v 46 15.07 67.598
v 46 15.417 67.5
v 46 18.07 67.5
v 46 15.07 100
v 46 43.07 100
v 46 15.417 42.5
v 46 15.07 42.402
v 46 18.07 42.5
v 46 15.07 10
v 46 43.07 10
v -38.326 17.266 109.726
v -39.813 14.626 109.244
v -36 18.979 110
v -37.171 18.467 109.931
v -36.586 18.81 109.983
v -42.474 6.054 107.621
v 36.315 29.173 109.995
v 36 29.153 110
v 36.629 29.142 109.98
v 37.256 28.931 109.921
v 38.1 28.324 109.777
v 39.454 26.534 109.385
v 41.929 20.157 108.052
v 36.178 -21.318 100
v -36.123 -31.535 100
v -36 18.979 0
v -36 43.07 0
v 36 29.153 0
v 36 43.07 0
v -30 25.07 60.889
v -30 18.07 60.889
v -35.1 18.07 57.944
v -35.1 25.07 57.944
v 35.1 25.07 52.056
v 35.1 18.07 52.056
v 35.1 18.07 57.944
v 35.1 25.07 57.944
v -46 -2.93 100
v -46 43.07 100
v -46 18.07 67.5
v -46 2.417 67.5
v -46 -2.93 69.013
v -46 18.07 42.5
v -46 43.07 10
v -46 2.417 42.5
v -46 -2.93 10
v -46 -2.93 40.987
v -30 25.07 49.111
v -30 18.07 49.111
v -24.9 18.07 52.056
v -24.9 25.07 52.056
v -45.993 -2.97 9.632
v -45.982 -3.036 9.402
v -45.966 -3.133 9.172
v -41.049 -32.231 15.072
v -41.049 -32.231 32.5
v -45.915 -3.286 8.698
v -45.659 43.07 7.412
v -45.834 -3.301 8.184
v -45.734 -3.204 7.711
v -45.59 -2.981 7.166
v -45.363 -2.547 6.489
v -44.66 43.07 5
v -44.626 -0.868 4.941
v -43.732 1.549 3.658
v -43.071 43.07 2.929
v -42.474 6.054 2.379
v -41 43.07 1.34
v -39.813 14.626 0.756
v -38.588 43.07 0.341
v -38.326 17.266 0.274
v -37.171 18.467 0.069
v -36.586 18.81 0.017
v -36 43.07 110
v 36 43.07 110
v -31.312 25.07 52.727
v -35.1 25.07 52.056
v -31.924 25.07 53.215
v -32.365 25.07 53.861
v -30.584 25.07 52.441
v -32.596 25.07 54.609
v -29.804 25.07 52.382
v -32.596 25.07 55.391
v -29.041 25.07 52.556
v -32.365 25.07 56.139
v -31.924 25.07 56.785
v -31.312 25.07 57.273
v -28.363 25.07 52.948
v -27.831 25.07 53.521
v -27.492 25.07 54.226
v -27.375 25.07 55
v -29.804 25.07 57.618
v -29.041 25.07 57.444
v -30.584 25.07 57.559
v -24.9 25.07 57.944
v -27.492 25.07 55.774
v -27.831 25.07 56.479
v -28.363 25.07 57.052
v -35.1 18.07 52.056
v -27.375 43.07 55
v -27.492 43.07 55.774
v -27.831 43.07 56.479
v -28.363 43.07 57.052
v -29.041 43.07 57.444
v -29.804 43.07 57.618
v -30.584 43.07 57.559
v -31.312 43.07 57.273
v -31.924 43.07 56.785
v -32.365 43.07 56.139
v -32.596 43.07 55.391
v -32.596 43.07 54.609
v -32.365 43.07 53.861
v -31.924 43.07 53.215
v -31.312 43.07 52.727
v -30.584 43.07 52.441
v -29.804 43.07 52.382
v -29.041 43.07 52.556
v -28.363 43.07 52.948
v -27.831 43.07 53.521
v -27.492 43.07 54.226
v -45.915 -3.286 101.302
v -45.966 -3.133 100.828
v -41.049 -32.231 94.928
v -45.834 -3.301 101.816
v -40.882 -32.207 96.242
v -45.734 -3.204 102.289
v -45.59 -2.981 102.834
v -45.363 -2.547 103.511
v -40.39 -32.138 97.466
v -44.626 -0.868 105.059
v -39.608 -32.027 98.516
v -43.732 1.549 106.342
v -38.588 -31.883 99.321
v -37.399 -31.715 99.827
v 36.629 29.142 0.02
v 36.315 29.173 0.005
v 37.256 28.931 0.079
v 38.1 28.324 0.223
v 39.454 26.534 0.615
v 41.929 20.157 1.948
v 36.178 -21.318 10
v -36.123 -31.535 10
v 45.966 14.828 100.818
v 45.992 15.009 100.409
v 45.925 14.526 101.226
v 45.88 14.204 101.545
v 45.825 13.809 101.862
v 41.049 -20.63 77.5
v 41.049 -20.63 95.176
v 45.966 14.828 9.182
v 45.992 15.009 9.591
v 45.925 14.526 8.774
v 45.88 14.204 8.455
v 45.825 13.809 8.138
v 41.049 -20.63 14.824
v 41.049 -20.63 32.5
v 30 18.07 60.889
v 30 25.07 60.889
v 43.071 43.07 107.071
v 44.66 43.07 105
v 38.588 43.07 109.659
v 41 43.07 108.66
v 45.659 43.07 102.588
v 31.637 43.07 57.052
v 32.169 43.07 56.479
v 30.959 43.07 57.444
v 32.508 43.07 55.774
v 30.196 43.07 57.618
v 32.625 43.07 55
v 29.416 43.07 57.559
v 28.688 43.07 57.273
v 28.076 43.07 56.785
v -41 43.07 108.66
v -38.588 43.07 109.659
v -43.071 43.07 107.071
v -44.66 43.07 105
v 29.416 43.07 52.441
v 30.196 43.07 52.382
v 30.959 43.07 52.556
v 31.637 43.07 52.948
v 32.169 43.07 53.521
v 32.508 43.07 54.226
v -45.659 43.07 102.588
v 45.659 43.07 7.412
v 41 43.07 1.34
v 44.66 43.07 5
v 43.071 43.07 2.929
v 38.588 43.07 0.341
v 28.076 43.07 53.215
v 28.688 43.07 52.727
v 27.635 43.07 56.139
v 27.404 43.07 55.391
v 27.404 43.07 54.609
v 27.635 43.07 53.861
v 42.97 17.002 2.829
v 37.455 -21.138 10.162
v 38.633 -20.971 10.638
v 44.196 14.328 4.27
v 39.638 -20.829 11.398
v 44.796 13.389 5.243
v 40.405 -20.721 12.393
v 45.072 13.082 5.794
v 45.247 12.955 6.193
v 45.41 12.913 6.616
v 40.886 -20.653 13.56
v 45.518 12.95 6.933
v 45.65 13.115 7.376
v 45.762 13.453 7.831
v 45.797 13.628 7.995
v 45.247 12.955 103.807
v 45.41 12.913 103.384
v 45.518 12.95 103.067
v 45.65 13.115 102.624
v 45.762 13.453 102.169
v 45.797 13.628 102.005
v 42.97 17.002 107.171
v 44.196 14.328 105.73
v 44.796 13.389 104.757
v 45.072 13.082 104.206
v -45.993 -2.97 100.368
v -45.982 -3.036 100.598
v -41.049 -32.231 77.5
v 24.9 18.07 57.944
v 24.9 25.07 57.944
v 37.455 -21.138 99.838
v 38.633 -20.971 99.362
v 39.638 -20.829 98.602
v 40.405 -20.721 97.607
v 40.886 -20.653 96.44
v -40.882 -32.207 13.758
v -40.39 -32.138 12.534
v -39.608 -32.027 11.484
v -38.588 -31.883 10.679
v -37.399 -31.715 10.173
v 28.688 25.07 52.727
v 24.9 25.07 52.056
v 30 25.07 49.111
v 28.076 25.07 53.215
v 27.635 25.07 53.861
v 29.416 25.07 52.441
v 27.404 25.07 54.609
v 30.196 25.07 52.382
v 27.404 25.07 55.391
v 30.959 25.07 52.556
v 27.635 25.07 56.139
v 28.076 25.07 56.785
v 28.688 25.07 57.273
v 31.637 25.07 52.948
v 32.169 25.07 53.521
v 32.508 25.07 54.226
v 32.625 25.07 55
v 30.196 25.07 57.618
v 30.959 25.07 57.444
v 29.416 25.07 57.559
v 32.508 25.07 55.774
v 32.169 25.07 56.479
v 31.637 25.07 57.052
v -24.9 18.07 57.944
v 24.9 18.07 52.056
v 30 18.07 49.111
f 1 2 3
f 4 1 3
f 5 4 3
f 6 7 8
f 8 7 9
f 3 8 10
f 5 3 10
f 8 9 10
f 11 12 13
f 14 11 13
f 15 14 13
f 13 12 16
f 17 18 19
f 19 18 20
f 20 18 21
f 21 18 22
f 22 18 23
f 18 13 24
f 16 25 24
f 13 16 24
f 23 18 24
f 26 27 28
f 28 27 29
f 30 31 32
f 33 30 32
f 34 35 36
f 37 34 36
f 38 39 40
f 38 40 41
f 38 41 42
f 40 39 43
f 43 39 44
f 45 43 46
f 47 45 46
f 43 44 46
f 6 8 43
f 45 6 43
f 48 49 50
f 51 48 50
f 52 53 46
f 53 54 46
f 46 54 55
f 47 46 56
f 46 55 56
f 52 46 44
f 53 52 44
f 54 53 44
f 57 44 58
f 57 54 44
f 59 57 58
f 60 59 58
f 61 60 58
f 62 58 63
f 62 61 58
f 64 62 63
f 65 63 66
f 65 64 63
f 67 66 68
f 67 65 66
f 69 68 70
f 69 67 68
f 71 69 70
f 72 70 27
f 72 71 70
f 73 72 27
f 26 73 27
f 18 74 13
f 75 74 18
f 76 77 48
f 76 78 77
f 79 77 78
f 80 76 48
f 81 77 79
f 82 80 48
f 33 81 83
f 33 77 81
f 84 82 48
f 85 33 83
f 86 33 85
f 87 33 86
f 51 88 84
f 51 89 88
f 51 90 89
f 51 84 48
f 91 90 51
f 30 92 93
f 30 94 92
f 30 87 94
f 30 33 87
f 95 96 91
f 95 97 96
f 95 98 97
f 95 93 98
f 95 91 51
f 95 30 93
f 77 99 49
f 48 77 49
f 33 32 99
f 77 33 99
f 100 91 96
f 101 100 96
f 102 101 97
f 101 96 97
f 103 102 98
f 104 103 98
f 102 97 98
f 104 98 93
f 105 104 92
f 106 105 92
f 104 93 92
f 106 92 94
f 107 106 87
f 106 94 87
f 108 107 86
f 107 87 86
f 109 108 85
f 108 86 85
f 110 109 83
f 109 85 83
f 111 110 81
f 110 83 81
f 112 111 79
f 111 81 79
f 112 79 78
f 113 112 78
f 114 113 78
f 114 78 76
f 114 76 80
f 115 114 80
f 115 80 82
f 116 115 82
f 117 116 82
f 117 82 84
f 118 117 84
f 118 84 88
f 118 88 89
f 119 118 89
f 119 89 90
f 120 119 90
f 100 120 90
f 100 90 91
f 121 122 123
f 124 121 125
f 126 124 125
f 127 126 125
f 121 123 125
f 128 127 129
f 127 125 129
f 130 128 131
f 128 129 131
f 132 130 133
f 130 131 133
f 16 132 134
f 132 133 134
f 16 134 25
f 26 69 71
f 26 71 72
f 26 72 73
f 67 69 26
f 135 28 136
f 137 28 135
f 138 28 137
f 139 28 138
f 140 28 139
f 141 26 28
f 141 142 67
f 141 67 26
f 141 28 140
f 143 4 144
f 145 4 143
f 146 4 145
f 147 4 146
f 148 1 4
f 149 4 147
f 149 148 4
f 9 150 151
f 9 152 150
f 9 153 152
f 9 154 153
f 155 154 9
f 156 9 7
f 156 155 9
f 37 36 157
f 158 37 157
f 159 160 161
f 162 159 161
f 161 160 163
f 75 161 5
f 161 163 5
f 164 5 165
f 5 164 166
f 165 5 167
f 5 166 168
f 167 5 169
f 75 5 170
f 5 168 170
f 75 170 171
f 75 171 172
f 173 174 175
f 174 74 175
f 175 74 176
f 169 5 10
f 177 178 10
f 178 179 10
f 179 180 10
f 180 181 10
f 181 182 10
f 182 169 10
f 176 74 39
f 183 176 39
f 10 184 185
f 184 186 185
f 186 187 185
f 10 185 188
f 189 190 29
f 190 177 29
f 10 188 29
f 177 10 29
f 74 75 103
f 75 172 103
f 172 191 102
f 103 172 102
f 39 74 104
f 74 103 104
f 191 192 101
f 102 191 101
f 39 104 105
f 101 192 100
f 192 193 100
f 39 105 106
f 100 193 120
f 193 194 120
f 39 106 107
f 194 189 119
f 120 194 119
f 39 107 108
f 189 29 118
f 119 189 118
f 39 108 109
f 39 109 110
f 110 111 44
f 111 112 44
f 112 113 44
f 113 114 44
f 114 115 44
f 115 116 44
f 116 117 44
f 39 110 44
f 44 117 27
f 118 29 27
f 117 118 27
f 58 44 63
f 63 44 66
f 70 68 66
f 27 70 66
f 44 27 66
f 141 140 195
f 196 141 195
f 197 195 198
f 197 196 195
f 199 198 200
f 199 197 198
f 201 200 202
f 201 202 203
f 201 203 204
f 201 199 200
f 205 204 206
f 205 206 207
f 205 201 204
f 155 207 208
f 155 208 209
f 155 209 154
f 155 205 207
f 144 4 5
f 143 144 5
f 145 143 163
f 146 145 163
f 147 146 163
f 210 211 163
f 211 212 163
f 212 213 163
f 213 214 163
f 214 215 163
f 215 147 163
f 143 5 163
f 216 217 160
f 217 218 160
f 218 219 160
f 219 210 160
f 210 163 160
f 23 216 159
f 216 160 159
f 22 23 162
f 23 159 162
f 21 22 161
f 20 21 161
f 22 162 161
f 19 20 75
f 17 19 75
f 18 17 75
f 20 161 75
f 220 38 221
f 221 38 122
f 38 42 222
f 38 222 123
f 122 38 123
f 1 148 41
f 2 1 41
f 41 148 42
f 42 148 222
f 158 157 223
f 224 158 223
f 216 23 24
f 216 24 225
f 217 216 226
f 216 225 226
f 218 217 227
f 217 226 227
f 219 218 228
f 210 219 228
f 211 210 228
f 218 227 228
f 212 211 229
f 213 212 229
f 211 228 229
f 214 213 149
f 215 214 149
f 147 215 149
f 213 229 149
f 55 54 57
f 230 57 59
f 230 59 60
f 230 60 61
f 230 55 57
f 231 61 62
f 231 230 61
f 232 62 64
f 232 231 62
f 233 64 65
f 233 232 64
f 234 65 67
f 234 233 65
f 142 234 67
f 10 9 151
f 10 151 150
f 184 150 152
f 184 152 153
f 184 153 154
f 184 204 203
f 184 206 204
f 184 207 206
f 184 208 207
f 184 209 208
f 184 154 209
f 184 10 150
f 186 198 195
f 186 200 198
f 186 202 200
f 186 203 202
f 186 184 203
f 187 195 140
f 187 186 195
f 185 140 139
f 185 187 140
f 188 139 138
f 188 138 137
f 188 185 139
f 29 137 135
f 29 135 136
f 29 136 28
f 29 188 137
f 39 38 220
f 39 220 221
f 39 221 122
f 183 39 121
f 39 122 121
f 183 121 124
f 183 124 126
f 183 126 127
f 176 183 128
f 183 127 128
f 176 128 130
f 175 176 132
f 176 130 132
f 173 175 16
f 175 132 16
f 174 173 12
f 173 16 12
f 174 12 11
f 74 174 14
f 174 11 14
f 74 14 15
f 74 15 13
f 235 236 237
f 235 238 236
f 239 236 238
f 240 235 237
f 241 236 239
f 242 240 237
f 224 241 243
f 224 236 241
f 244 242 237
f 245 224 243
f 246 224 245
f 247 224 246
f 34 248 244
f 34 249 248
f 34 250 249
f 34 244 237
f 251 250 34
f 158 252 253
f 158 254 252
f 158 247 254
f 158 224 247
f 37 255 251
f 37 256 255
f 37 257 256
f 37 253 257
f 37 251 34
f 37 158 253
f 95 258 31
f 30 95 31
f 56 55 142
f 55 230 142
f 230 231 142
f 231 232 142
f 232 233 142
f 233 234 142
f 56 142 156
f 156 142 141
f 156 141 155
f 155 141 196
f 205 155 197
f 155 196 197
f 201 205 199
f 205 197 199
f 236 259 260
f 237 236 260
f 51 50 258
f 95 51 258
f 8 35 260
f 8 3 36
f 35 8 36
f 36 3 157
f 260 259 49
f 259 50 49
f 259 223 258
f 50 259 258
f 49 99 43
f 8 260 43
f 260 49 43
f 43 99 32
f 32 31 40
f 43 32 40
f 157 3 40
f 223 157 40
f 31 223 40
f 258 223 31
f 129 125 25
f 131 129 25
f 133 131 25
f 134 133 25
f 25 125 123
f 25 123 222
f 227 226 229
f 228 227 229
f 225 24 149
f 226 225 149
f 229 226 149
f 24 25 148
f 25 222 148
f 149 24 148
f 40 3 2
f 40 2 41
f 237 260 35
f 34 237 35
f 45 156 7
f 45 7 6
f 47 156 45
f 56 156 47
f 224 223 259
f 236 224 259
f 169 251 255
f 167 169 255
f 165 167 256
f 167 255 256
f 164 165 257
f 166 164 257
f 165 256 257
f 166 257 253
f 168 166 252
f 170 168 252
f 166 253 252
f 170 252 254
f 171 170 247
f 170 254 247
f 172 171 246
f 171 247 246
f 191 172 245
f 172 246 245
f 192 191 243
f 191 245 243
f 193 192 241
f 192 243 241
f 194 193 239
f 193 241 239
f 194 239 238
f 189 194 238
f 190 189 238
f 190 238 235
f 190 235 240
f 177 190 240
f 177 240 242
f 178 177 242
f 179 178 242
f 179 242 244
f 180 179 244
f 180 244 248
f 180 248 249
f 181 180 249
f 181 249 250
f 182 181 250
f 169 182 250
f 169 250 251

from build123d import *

# Parameters (mm, degrees)
F1_DEPTH  = 110
F3_W      = 92
F3_H      = 25
F4_DEPTH  = 80
F5_SIZE2  = 10
F5_SIZE   = 50
F6_SIZE2  = 10
F6_SIZE   = 50
F7_SIZE2  = 10
F7_SIZE   = 35
F8_SIZE2  = 10
F8_SIZE   = 35
F9_SIZE2  = 5
F9_SIZE   = 35
F10_SIZE2 = 5
F10_SIZE  = 30
F11_R     = 10
F12_R     = 5
F14_D     = 5.25
F16_DEPTH = 7


with BuildPart() as f1:
    # F0 (on Top) → F1 (new body)
    with BuildSketch(Plane.XY):
        Polygon((46, 43.0696749699), (-46, 43.0696749699), (-46, -32.9303250301), (46, -19.9303250301), align=None)
    extrude(amount=F1_DEPTH)

    # F3 (on offset) → F4 (cut)
    with BuildSketch(Plane(origin=(0, 18.0696749699, 0), x_dir=(-1, 0, 0), z_dir=(0, 1, 0))):
        with Locations((0, 55)):
            Rectangle(F3_W, F3_H)
    extrude(amount=-F4_DEPTH, mode=Mode.SUBTRACT)

    # F5
    f5_edges = [f1.edges().sort_by_distance(p)[0] for p in [
        (0, -26.430325, 110),
    ]]
    f5_side = f1.faces().sort_by_distance((-1.434053, 8.218356, 110))[0]
    chamfer(f5_edges, length=F5_SIZE, length2=F5_SIZE2, reference=f5_side)

    # F6
    f6_edges = [f1.edges().sort_by_distance(p)[0] for p in [
        (0, -26.430325, 0),
    ]]
    f6_side = f1.faces().sort_by_distance((-1.434053, 8.218356, 0))[0]
    chamfer(f6_edges, length=F6_SIZE, length2=F6_SIZE2, reference=f6_side)

    # F7
    f7_edges = [f1.edges().sort_by_distance(p)[0] for p in [
        (0, -26.430325, 67.5),
    ]]
    f7_side = f1.faces().sort_by_distance((-2.2397, -4.338565, 67.5))[0]
    chamfer(f7_edges, length=F7_SIZE, length2=F7_SIZE2, reference=f7_side)

    # F8
    f8_edges = [f1.edges().sort_by_distance(p)[0] for p in [
        (0, -26.430325, 42.5),
    ]]
    f8_side = f1.faces().sort_by_distance((-2.2397, -4.338565, 42.5))[0]
    chamfer(f8_edges, length=F8_SIZE, length2=F8_SIZE2, reference=f8_side)

    # F9
    f9_edges = [f1.edges().sort_by_distance(p)[0] for p in [
        (46, -19.930325, 21.25),
        (46, -19.930325, 88.75),
    ]]
    f9_side = f1.faces().sort_by_distance((46, 16.743522, 41.232364))[0]
    chamfer(f9_edges, length=F9_SIZE, length2=F9_SIZE2, reference=f9_side)

    # F10
    f10_edges = [f1.edges().sort_by_distance(p)[0] for p in [
        (-46, -32.930325, 88.75),
        (-46, -32.930325, 21.25),
    ]]
    f10_side = f1.faces().sort_by_distance((-46, 10.243522, 41.162988))[0]
    chamfer(f10_edges, length=F10_SIZE, length2=F10_SIZE2, reference=f10_side)

    # F11
    f11_edges = [f1.edges().sort_by_distance(p)[0] for p in [
        (-46, 30.318028, 110),
        (-46, 30.318028, 0),
        (46, 36.818028, 0),
        (46, 36.818028, 110),
    ]]
    fillet(f11_edges, radius=F11_R)

    # F12
    f12_edges = [f1.edges().sort_by_distance(p)[0] for p in [
        (-42.964823, -20.893414, 7.701231),
        (42.845838, -7.674494, 7.484682),
        (42.845838, -7.674494, 102.515318),
        (-42.964823, -20.893414, 102.298769),
    ]]
    fillet(f12_edges, radius=F12_R)

    # F14 (through all)
    with Locations(Plane(origin=(0, 43.0696749699, 0), x_dir=(-1, 0, 0), z_dir=(0, 1, 0))):
        with Locations((-30, 55), (30, 55)):
            Hole(F14_D / 2)

    # F15 (on face) → F16 (cut)
    with BuildSketch(Plane.XZ.offset(-18.0696749699)):
        Polygon((-24.9, 52.0555136271), (-24.9, 57.9444863729), (-30, 60.8889727457), (-35.1, 57.9444863729), (-35.1, 52.0555136271), (-30, 49.1110272543), align=None)
        Polygon((24.9, 57.9444863729), (24.9, 52.0555136271), (30, 49.1110272543), (35.1, 52.0555136271), (35.1, 57.9444863729), (30, 60.8889727457), align=None)
    extrude(amount=-F16_DEPTH, mode=Mode.SUBTRACT)


solid = f1.part
